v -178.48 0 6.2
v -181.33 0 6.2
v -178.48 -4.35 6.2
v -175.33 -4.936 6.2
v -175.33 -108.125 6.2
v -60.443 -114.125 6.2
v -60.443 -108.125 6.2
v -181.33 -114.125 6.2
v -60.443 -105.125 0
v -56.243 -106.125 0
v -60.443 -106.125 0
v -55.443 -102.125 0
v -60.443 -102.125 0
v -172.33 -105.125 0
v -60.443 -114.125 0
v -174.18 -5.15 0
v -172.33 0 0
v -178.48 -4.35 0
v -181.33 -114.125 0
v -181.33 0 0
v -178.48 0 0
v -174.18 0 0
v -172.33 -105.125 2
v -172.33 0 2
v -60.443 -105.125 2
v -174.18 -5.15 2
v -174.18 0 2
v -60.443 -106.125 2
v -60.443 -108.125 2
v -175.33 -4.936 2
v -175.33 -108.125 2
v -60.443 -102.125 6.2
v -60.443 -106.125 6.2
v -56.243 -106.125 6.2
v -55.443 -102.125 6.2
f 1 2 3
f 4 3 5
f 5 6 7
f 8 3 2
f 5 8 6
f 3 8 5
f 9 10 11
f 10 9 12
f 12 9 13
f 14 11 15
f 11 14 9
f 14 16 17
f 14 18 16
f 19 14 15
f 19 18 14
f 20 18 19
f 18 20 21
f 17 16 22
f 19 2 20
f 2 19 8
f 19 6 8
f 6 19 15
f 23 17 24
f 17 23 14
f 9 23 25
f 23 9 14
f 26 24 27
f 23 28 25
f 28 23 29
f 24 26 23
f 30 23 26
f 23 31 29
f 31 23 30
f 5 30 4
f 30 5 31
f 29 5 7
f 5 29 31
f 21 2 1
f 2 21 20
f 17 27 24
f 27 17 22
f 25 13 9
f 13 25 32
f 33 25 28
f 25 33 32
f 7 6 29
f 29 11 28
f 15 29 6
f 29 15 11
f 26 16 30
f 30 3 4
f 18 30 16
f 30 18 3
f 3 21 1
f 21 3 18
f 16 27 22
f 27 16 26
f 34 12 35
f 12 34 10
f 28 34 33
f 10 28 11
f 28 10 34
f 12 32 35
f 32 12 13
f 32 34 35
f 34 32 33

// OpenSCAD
// ============================================
// Plate 9: 프레임 - 하단 좌 (BL)
// 크기: ~121 x ~114 mm (OK)
// ============================================
use <../src/model_a_frame.scad>

frame_seg_BL();
